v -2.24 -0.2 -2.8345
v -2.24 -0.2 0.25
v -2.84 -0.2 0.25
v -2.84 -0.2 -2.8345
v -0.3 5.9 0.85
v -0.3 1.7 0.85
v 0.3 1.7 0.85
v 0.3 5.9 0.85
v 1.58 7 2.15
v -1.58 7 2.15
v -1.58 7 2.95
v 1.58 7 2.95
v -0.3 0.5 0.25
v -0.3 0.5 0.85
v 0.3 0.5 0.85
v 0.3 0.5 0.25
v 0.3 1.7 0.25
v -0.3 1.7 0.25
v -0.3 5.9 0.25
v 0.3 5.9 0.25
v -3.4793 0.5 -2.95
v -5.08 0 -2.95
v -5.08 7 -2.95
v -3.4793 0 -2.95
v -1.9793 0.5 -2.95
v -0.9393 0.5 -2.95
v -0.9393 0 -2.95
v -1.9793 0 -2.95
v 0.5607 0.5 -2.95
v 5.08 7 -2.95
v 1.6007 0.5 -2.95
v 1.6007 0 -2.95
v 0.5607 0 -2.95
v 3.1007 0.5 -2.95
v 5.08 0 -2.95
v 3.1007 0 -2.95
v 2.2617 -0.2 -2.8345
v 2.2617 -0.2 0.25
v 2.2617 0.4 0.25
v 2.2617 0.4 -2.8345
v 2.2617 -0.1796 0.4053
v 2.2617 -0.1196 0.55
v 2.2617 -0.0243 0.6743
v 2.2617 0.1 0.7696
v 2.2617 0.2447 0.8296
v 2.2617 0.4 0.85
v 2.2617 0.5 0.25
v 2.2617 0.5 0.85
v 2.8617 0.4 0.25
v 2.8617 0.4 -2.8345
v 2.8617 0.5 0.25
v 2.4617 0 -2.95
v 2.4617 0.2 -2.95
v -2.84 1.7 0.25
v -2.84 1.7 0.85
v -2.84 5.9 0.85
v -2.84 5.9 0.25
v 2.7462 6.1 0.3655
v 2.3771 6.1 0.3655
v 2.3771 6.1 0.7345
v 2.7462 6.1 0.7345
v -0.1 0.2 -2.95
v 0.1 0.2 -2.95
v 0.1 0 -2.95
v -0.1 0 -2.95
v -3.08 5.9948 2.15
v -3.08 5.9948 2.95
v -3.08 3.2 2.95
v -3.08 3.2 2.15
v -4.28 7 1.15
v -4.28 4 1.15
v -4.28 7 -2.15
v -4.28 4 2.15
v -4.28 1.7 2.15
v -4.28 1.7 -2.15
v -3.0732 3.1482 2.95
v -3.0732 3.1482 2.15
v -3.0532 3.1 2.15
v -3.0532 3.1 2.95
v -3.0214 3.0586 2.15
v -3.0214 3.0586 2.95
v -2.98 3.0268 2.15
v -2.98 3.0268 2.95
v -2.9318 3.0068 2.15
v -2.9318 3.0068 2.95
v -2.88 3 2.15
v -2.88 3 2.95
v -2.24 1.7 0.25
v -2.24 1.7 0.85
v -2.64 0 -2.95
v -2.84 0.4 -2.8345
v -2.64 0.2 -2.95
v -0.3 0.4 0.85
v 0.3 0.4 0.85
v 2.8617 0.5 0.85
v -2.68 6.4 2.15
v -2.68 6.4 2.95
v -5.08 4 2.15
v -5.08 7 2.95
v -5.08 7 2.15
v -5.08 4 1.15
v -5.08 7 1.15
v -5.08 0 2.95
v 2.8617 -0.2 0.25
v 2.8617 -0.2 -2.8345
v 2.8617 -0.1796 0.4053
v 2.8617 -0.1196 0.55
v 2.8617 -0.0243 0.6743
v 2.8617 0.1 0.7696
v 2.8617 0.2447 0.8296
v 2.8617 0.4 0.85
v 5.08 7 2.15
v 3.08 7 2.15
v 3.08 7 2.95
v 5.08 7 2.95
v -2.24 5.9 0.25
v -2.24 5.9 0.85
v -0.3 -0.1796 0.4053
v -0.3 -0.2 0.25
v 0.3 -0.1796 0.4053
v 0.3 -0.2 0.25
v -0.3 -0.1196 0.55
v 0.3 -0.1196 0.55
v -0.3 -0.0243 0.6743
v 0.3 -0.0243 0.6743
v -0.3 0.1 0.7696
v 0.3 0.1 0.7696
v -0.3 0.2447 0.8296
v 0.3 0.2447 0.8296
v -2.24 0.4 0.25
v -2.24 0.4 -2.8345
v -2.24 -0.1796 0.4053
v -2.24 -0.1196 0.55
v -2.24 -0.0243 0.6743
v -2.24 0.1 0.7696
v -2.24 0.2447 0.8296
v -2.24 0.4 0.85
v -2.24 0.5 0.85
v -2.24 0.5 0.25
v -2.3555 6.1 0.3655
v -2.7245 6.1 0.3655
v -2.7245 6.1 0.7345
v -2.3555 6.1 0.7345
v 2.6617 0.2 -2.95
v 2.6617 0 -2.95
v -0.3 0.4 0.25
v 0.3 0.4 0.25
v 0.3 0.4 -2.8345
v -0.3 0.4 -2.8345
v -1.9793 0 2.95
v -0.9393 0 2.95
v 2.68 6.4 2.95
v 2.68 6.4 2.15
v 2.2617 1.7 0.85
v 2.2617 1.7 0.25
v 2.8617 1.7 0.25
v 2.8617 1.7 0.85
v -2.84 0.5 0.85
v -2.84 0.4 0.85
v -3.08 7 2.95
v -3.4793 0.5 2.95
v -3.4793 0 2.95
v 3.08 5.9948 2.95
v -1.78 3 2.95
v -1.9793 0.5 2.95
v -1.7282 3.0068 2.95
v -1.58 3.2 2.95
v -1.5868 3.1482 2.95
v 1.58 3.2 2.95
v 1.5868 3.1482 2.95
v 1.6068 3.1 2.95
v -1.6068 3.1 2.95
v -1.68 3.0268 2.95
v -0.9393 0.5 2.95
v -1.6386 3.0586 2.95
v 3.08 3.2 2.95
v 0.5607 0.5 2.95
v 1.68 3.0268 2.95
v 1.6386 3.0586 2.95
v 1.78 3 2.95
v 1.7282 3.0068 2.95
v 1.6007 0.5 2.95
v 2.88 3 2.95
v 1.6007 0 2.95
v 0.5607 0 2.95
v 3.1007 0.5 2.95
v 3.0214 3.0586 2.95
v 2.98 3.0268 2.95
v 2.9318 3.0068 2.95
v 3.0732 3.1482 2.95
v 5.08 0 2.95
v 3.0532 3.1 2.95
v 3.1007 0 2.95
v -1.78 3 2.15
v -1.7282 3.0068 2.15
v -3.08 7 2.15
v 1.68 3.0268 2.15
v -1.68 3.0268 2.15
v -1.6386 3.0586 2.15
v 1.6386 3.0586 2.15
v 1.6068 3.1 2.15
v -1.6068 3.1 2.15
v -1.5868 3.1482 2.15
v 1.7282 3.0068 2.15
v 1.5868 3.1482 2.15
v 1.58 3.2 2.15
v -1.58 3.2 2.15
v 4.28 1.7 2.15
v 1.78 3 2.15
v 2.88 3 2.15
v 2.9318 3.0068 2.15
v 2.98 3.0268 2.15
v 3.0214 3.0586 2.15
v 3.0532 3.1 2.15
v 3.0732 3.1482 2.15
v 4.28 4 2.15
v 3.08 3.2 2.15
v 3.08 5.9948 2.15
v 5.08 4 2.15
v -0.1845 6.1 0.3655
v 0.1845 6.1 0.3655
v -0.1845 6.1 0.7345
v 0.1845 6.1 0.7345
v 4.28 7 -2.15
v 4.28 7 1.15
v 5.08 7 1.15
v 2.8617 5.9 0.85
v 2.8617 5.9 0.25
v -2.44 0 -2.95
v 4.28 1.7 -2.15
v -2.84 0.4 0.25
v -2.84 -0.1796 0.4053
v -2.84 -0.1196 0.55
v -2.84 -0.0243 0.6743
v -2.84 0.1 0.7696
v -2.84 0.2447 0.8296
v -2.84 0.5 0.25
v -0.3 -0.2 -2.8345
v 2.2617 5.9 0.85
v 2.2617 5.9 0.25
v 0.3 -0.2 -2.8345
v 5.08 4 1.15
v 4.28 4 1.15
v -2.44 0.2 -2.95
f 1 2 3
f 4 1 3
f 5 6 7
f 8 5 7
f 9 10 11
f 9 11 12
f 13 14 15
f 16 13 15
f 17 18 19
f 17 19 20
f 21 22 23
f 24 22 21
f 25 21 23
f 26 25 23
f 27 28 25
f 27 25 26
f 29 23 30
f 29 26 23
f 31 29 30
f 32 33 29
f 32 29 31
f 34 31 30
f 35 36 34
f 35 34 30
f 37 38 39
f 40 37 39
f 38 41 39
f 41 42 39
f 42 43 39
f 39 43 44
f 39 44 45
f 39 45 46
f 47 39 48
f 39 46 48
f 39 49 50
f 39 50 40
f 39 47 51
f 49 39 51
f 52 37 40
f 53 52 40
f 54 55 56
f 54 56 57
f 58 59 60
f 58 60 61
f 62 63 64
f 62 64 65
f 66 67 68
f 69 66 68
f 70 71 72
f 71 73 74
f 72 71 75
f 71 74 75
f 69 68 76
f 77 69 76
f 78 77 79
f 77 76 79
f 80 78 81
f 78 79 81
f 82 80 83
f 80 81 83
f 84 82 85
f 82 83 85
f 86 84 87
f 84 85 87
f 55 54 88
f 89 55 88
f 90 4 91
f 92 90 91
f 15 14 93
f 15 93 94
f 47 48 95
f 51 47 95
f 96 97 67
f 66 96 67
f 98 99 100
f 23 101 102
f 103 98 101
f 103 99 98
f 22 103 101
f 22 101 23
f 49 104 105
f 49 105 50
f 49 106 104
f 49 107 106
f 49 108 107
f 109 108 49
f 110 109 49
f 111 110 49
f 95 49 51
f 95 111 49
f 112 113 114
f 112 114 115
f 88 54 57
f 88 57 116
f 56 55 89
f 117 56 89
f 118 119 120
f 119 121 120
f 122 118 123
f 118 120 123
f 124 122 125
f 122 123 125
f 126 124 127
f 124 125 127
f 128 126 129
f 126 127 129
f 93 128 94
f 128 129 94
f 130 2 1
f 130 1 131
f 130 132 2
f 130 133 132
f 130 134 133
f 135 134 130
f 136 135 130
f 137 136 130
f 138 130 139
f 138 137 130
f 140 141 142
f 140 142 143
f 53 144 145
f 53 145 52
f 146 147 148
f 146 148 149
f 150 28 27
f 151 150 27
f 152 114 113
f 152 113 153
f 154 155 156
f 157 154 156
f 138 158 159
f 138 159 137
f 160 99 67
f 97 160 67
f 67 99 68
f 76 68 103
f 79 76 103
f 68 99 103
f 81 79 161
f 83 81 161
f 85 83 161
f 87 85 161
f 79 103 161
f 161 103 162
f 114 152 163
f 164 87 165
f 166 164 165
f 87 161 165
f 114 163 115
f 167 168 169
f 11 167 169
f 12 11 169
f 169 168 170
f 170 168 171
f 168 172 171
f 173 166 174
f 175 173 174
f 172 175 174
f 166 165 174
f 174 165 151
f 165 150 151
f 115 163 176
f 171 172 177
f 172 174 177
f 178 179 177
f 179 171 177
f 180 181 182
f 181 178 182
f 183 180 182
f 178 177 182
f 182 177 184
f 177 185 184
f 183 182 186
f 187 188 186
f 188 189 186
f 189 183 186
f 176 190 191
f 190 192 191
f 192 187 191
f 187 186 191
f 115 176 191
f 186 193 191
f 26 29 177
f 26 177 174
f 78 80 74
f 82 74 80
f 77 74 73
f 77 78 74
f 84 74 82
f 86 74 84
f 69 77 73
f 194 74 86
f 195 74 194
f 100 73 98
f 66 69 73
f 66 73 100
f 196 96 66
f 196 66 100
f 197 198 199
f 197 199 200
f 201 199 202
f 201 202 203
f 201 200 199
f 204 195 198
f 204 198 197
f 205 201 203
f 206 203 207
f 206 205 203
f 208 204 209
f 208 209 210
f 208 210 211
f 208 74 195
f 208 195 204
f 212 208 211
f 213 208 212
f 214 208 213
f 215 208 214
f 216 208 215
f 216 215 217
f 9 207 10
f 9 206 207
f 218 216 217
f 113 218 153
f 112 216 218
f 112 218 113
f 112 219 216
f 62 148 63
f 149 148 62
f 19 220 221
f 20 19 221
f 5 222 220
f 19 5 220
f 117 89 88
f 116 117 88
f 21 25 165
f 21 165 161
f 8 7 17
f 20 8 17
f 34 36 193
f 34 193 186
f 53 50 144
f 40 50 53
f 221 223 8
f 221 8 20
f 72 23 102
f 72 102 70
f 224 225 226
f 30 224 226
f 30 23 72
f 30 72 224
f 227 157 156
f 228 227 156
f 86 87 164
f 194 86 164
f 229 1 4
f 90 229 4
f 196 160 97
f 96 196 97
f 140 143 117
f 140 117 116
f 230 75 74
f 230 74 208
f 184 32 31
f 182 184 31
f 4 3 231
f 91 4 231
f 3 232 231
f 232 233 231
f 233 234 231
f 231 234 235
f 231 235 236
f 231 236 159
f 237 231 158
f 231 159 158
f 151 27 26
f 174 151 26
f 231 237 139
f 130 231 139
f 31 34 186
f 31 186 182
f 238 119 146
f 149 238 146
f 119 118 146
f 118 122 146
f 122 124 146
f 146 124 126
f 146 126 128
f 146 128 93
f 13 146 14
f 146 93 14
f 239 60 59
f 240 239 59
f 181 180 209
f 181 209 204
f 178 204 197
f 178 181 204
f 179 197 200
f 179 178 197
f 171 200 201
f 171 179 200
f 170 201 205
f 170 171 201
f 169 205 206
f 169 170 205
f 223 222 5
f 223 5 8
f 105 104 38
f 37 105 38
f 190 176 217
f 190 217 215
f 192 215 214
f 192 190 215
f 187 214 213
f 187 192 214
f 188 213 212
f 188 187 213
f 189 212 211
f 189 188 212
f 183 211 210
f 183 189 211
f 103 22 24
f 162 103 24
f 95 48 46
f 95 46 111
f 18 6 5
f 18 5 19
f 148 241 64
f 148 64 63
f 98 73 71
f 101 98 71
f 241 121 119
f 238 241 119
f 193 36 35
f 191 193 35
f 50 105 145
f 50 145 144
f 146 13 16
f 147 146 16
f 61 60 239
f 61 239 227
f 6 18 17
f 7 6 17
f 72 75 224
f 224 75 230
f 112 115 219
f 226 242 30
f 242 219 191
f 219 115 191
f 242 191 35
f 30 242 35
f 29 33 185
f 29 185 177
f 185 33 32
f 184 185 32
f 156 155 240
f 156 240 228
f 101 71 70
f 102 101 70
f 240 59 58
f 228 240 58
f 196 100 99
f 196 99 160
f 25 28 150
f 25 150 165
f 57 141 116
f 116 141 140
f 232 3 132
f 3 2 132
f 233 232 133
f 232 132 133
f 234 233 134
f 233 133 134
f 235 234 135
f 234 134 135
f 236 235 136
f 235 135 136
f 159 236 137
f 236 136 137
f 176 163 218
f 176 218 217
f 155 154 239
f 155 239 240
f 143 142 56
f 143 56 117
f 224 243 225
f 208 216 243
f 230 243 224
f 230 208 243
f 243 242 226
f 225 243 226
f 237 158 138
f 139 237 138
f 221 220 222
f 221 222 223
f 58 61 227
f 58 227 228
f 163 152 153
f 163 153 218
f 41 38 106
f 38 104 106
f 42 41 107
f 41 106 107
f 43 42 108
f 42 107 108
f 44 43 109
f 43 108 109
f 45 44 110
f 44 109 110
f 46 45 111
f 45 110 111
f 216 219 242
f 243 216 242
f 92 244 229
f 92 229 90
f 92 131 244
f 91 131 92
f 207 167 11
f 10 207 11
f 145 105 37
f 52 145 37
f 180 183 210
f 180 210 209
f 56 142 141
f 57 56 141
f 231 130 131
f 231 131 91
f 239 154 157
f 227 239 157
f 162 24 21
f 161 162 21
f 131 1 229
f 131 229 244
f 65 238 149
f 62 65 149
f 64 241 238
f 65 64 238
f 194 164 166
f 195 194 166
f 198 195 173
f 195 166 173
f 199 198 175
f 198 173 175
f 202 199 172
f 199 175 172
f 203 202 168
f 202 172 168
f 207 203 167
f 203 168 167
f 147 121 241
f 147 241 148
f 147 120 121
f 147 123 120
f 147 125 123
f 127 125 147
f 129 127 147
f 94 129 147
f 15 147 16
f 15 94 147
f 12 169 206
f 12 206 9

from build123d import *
from OCP.BRepFilletAPI import BRepFilletAPI_MakeChamfer

# Parameters (mm, degrees)
SKETCH2_W             = 10.16
SKETCH2_H             = 5.9
BOSS_EXTRUDE1_DEPTH   = 1.7
SKETCH3_W             = 10.16
SKETCH3_H             = 5.9
SKETCH3_W_2           = 8.56
SKETCH3_H_2           = 4.3
BOSS_EXTRUDE2_DEPTH   = 5.3
SKETCH4_W             = 0.6
SKETCH4_H             = 0.6
BOSS_EXTRUDE3_DEPTH   = 4.4
BOSS_EXTRUDE3_2_DEPTH = 4.4
BOSS_EXTRUDE3_3_DEPTH = 4.4
CHAMFER1_SIZE         = 0.2
CHAMFER1_SIZE2        = 0.115470054
CHAMFER2_SIZE         = 0.2
CHAMFER2_SIZE2        = 0.115470054
CHAMFER3_SIZE         = 0.2
CHAMFER3_SIZE2        = 0.115470054
SKETCH5_W             = 1
SKETCH5_H             = 3
CUT_EXTRUDE1_DEPTH    = 0.8
SKETCH6_W             = 1
SKETCH6_H             = 3
CUT_EXTRUDE2_DEPTH    = 3.3
CUT_EXTRUDE3_DEPTH    = 0.8
SKETCH8_W             = 1.5
SKETCH8_H             = 0.5
CUT_EXTRUDE4_DEPTH    = 6.3
SKETCH9_W             = 0.6
SKETCH9_H             = 0.6
BOSS_EXTRUDE4_DEPTH   = 0.7
BOSS_EXTRUDE4_2_DEPTH = 0.7
BOSS_EXTRUDE4_3_DEPTH = 0.7
SKETCH13_W            = 0.6
SKETCH13_H            = 0.6
BOSS_EXTRUDE5_DEPTH   = 3.2
FILLET1_R             = 0.6
CHAMFER4_SIZE         = 0.2
CHAMFER4_SIZE2        = 0.115470054
CHAMFER5_SIZE         = 0.2
CHAMFER5_SIZE2        = 0.115470054
CHAMFER6_SIZE         = 0.2
CHAMFER6_SIZE2        = 0.115470054
FILLET2_R             = 0.6
FILLET3_R             = 0.6


with BuildPart() as part:
    # Sketch2 → Boss-Extrude1 (new body)
    with BuildSketch(Plane(origin=(0, 0, 0), x_dir=(1, 0, 0), z_dir=(0, 1, 0))):
        Rectangle(SKETCH2_W, SKETCH2_H)
    extrude(amount=BOSS_EXTRUDE1_DEPTH)

    # Sketch3 → Boss-Extrude2 (add)
    with BuildSketch(Plane(origin=(0, 1.7, 0), x_dir=(1, 0, 0), z_dir=(0, 1, 0))):
        Rectangle(SKETCH3_W, SKETCH3_H)
        Rectangle(SKETCH3_W_2, SKETCH3_H_2, mode=Mode.SUBTRACT)
    extrude(amount=BOSS_EXTRUDE2_DEPTH)

    # Sketch5 → Cut-Extrude1 (cut)
    with BuildSketch(Plane(origin=(5.08, 0, 0), x_dir=(0, 0, -1), z_dir=(1, 0, 0))):
        with Locations((-1.65, 5.5)):
            Rectangle(SKETCH5_W, SKETCH5_H)
    extrude(amount=-CUT_EXTRUDE1_DEPTH, mode=Mode.SUBTRACT)

    # Sketch6 → Cut-Extrude2 (cut)
    with BuildSketch(Plane(origin=(-4.28, 0, 0), x_dir=(0, 0, -1), z_dir=(1, 0, 0))):
        with Locations((-1.65, 5.5)):
            Rectangle(SKETCH6_W, SKETCH6_H)
    extrude(amount=-CUT_EXTRUDE2_DEPTH, mode=Mode.SUBTRACT)

    # Sketch7 → Cut-Extrude3 (cut)
    with BuildSketch(Plane.XY.offset(2.95)):
        with BuildLine():
            Line((-3.08, 7), (-2.68, 6.4))
            Line((-2.68, 6.4), (-3.08, 5.994767126))
            Line((-3.08, 5.994767126), (-3.08, 3.2))
            ThreePointArc((-3.08, 3.2), (-3.021421356, 3.058578644), (-2.88, 3))
            Line((-2.88, 3), (-1.78, 3))
            ThreePointArc((-1.78, 3), (-1.638578644, 3.058578644), (-1.58, 3.2))
            Line((-1.58, 3.2), (-1.58, 7))
            Line((-1.58, 7), (-3.08, 7))
        make_face()
        with BuildLine():
            Line((1.58, 7), (3.08, 7))
            Line((3.08, 7), (2.68, 6.4))
            Line((2.68, 6.4), (3.08, 5.994767126))
            Line((3.08, 5.994767126), (3.08, 3.2))
            ThreePointArc((3.08, 3.2), (3.021421356, 3.058578644), (2.88, 3))
            Line((2.88, 3), (1.78, 3))
            ThreePointArc((1.78, 3), (1.638578644, 3.058578644), (1.58, 3.2))
            Line((1.58, 3.2), (1.58, 7))
        make_face()
    extrude(amount=-CUT_EXTRUDE3_DEPTH, mode=Mode.SUBTRACT)

    # Sketch8 → Cut-Extrude4 (cut)
    with BuildSketch(Plane(origin=(0, 0, -2.95), x_dir=(-1, 0, 0), z_dir=(0, 0, -1))):
        with Locations((0.189333309, 0.25)):
            Rectangle(SKETCH8_W, SKETCH8_H)
        with Locations((2.729333309, 0.25)):
            Rectangle(SKETCH8_W, SKETCH8_H)
        with Locations((-2.350666691, 0.25)):
            Rectangle(SKETCH8_W, SKETCH8_H)
    extrude(amount=-CUT_EXTRUDE4_DEPTH, mode=Mode.SUBTRACT)


with BuildPart() as body_2:
    # Sketch4 → Boss-Extrude3 (new body)
    with BuildSketch(Plane(origin=(0, 1.7, 0), x_dir=(1, 0, 0), z_dir=(0, 1, 0))):
        with Locations((0, -0.55)):
            Rectangle(SKETCH4_W, SKETCH4_H)
    extrude(amount=BOSS_EXTRUDE3_DEPTH)

    # Chamfer2: one chamfer whose edges measure the first distance from different faces: ONE call of the kernel's chamfer builder (chamfer() names one face for all edges)
    chamfer2_edges_1 = [body_2.edges().sort_by_distance(p)[0] for p in [
        (-0.3, 6.1, 0.55),
    ]]
    chamfer2_side_1 = [body_2.faces().sort_by_distance(p)[0] for p in [
        (-0.3, 3.9, 0.55),
    ]]
    chamfer2_edges_2 = [body_2.edges().sort_by_distance(p)[0] for p in [
        (0, 6.1, 0.85),
    ]]
    chamfer2_side_2 = [body_2.faces().sort_by_distance(p)[0] for p in [
        (0, 3.9, 0.85),
    ]]
    chamfer2_edges_3 = [body_2.edges().sort_by_distance(p)[0] for p in [
        (0.3, 6.1, 0.55),
    ]]
    chamfer2_side_3 = [body_2.faces().sort_by_distance(p)[0] for p in [
        (0.3, 3.9, 0.55),
    ]]
    chamfer2_edges_4 = [body_2.edges().sort_by_distance(p)[0] for p in [
        (0, 6.1, 0.25),
    ]]
    chamfer2_side_4 = [body_2.faces().sort_by_distance(p)[0] for p in [
        (0, 3.9, 0.25),
    ]]
    chamfer2 = BRepFilletAPI_MakeChamfer(body_2.part.solid().wrapped)
    for e in chamfer2_edges_1:
        chamfer2.Add(CHAMFER2_SIZE, CHAMFER2_SIZE2, e.wrapped, chamfer2_side_1[0].wrapped)  # the first distance lies on this face
    for e in chamfer2_edges_2:
        chamfer2.Add(CHAMFER2_SIZE, CHAMFER2_SIZE2, e.wrapped, chamfer2_side_2[0].wrapped)  # the first distance lies on this face
    for e in chamfer2_edges_3:
        chamfer2.Add(CHAMFER2_SIZE, CHAMFER2_SIZE2, e.wrapped, chamfer2_side_3[0].wrapped)  # the first distance lies on this face
    for e in chamfer2_edges_4:
        chamfer2.Add(CHAMFER2_SIZE, CHAMFER2_SIZE2, e.wrapped, chamfer2_side_4[0].wrapped)  # the first distance lies on this face
    add(Compound.cast(chamfer2.Shape()), mode=Mode.REPLACE)


with BuildPart() as body_3:
    # Sketch4 → Boss-Extrude3 2 (new body)
    with BuildSketch(Plane(origin=(0, 1.7, 0), x_dir=(1, 0, 0), z_dir=(0, 1, 0))):
        with Locations((2.561655677, -0.55)):
            Rectangle(SKETCH4_W, SKETCH4_H)
    extrude(amount=BOSS_EXTRUDE3_2_DEPTH)

    # Chamfer3: one chamfer whose edges measure the first distance from different faces: ONE call of the kernel's chamfer builder (chamfer() names one face for all edges)
    chamfer3_edges_1 = [body_3.edges().sort_by_distance(p)[0] for p in [
        (2.261655677, 6.1, 0.55),
    ]]
    chamfer3_side_1 = [body_3.faces().sort_by_distance(p)[0] for p in [
        (2.261655677, 3.9, 0.55),
    ]]
    chamfer3_edges_2 = [body_3.edges().sort_by_distance(p)[0] for p in [
        (2.561655677, 6.1, 0.85),
    ]]
    chamfer3_side_2 = [body_3.faces().sort_by_distance(p)[0] for p in [
        (2.561655677, 3.9, 0.85),
    ]]
    chamfer3_edges_3 = [body_3.edges().sort_by_distance(p)[0] for p in [
        (2.861655677, 6.1, 0.55),
    ]]
    chamfer3_side_3 = [body_3.faces().sort_by_distance(p)[0] for p in [
        (2.861655677, 3.9, 0.55),
    ]]
    chamfer3_edges_4 = [body_3.edges().sort_by_distance(p)[0] for p in [
        (2.561655677, 6.1, 0.25),
    ]]
    chamfer3_side_4 = [body_3.faces().sort_by_distance(p)[0] for p in [
        (2.561655677, 3.9, 0.25),
    ]]
    chamfer3 = BRepFilletAPI_MakeChamfer(body_3.part.solid().wrapped)
    for e in chamfer3_edges_1:
        chamfer3.Add(CHAMFER3_SIZE, CHAMFER3_SIZE2, e.wrapped, chamfer3_side_1[0].wrapped)  # the first distance lies on this face
    for e in chamfer3_edges_2:
        chamfer3.Add(CHAMFER3_SIZE, CHAMFER3_SIZE2, e.wrapped, chamfer3_side_2[0].wrapped)  # the first distance lies on this face
    for e in chamfer3_edges_3:
        chamfer3.Add(CHAMFER3_SIZE, CHAMFER3_SIZE2, e.wrapped, chamfer3_side_3[0].wrapped)  # the first distance lies on this face
    for e in chamfer3_edges_4:
        chamfer3.Add(CHAMFER3_SIZE, CHAMFER3_SIZE2, e.wrapped, chamfer3_side_4[0].wrapped)  # the first distance lies on this face
    add(Compound.cast(chamfer3.Shape()), mode=Mode.REPLACE)


with BuildPart() as body_4:
    # Sketch4 → Boss-Extrude3 3 (new body)
    with BuildSketch(Plane(origin=(0, 1.7, 0), x_dir=(1, 0, 0), z_dir=(0, 1, 0))):
        with Locations((-2.54, -0.55)):
            Rectangle(SKETCH4_W, SKETCH4_H)
    extrude(amount=BOSS_EXTRUDE3_3_DEPTH)

    # Chamfer1: one chamfer whose edges measure the first distance from different faces: ONE call of the kernel's chamfer builder (chamfer() names one face for all edges)
    chamfer1_edges_1 = [body_4.edges().sort_by_distance(p)[0] for p in [
        (-2.84, 6.1, 0.55),
    ]]
    chamfer1_side_1 = [body_4.faces().sort_by_distance(p)[0] for p in [
        (-2.84, 3.9, 0.55),
    ]]
    chamfer1_edges_2 = [body_4.edges().sort_by_distance(p)[0] for p in [
        (-2.54, 6.1, 0.85),
    ]]
    chamfer1_side_2 = [body_4.faces().sort_by_distance(p)[0] for p in [
        (-2.54, 3.9, 0.85),
    ]]
    chamfer1_edges_3 = [body_4.edges().sort_by_distance(p)[0] for p in [
        (-2.24, 6.1, 0.55),
    ]]
    chamfer1_side_3 = [body_4.faces().sort_by_distance(p)[0] for p in [
        (-2.24, 3.9, 0.55),
    ]]
    chamfer1_edges_4 = [body_4.edges().sort_by_distance(p)[0] for p in [
        (-2.54, 6.1, 0.25),
    ]]
    chamfer1_side_4 = [body_4.faces().sort_by_distance(p)[0] for p in [
        (-2.54, 3.9, 0.25),
    ]]
    chamfer1 = BRepFilletAPI_MakeChamfer(body_4.part.solid().wrapped)
    for e in chamfer1_edges_1:
        chamfer1.Add(CHAMFER1_SIZE, CHAMFER1_SIZE2, e.wrapped, chamfer1_side_1[0].wrapped)  # the first distance lies on this face
    for e in chamfer1_edges_2:
        chamfer1.Add(CHAMFER1_SIZE, CHAMFER1_SIZE2, e.wrapped, chamfer1_side_2[0].wrapped)  # the first distance lies on this face
    for e in chamfer1_edges_3:
        chamfer1.Add(CHAMFER1_SIZE, CHAMFER1_SIZE2, e.wrapped, chamfer1_side_3[0].wrapped)  # the first distance lies on this face
    for e in chamfer1_edges_4:
        chamfer1.Add(CHAMFER1_SIZE, CHAMFER1_SIZE2, e.wrapped, chamfer1_side_4[0].wrapped)  # the first distance lies on this face
    add(Compound.cast(chamfer1.Shape()), mode=Mode.REPLACE)


with BuildPart() as body_5:
    # Sketch9 → Boss-Extrude4 (new body)
    with BuildSketch(Plane.XZ.offset(-0.5)):
        with Locations((-2.54, 0.55)):
            Rectangle(SKETCH9_W, SKETCH9_H)
    extrude(amount=BOSS_EXTRUDE4_DEPTH)



with BuildPart() as body_6:
    # Sketch9 → Boss-Extrude4 2 (new body)
    with BuildSketch(Plane.XZ.offset(-0.5)):
        with Locations((0, 0.55)):
            Rectangle(SKETCH9_W, SKETCH9_H)
    extrude(amount=BOSS_EXTRUDE4_2_DEPTH)


with BuildPart() as body_7:
    # Sketch9 → Boss-Extrude4 3 (new body)
    with BuildSketch(Plane.XZ.offset(-0.5)):
        with Locations((2.561655677, 0.55)):
            Rectangle(SKETCH9_W, SKETCH9_H)
    extrude(amount=BOSS_EXTRUDE4_3_DEPTH)


with BuildPart() as body_5_1:
    add(body_5.part)

    add(body_6.part)  # Boss-Extrude5 merges body 6

    add(body_7.part)  # Boss-Extrude5 merges body 7
    # Sketch13 → Boss-Extrude5 (add)
    with BuildSketch(Plane(origin=(0, 0, 0.25), x_dir=(-1, 0, 0), z_dir=(0, 0, -1))):
        with Locations((-2.561655677, 0.1)):
            Rectangle(SKETCH13_W, SKETCH13_H)
        with Locations((0, 0.1)):
            Rectangle(SKETCH13_W, SKETCH13_H)
        with Locations((2.54, 0.1)):
            Rectangle(SKETCH13_W, SKETCH13_H)
    extrude(amount=BOSS_EXTRUDE5_DEPTH)

    # Fillet1
    fillet1_edges = [body_5_1.edges().sort_by_distance(p)[0] for p in [
        (2.561655677, -0.2, 0.85),
    ]]
    fillet(fillet1_edges, radius=FILLET1_R)

    # Chamfer4
    chamfer4_edges = [body_5_1.edges().sort_by_distance(p)[0] for p in [
        (2.561655677, 0.4, -2.95),
        (2.261655677, 0.1, -2.95),
        (2.561655677, -0.2, -2.95),
        (2.861655677, 0.1, -2.95),
    ]]
    chamfer4_side = [body_5_1.faces().sort_by_distance(p)[0] for p in [
        (2.561655677, 0.1, -2.95),
    ]]
    chamfer(chamfer4_edges, length=CHAMFER4_SIZE, length2=CHAMFER4_SIZE2, reference=chamfer4_side[0])

    # Chamfer5
    chamfer5_edges = [body_5_1.edges().sort_by_distance(p)[0] for p in [
        (0, 0.4, -2.95),
        (-0.3, 0.1, -2.95),
        (0, -0.2, -2.95),
        (0.3, 0.1, -2.95),
    ]]
    chamfer5_side = [body_5_1.faces().sort_by_distance(p)[0] for p in [
        (0, 0.1, -2.95),
    ]]
    chamfer(chamfer5_edges, length=CHAMFER5_SIZE, length2=CHAMFER5_SIZE2, reference=chamfer5_side[0])

    # Chamfer6
    chamfer6_edges = [body_5_1.edges().sort_by_distance(p)[0] for p in [
        (-2.54, 0.4, -2.95),
        (-2.84, 0.1, -2.95),
        (-2.54, -0.2, -2.95),
        (-2.24, 0.1, -2.95),
    ]]
    chamfer6_side = [body_5_1.faces().sort_by_distance(p)[0] for p in [
        (-2.54, 0.1, -2.95),
    ]]
    chamfer(chamfer6_edges, length=CHAMFER6_SIZE, length2=CHAMFER6_SIZE2, reference=chamfer6_side[0])

    # Fillet2
    fillet2_edges = [body_5_1.edges().sort_by_distance(p)[0] for p in [
        (0, -0.2, 0.85),
    ]]
    fillet(fillet2_edges, radius=FILLET2_R)

    # Fillet3
    fillet3_edges = [body_5_1.edges().sort_by_distance(p)[0] for p in [
        (-2.54, -0.2, 0.85),
    ]]
    fillet(fillet3_edges, radius=FILLET3_R)


solid = Compound([part.part, body_2.part, body_3.part, body_4.part, body_5_1.part])
